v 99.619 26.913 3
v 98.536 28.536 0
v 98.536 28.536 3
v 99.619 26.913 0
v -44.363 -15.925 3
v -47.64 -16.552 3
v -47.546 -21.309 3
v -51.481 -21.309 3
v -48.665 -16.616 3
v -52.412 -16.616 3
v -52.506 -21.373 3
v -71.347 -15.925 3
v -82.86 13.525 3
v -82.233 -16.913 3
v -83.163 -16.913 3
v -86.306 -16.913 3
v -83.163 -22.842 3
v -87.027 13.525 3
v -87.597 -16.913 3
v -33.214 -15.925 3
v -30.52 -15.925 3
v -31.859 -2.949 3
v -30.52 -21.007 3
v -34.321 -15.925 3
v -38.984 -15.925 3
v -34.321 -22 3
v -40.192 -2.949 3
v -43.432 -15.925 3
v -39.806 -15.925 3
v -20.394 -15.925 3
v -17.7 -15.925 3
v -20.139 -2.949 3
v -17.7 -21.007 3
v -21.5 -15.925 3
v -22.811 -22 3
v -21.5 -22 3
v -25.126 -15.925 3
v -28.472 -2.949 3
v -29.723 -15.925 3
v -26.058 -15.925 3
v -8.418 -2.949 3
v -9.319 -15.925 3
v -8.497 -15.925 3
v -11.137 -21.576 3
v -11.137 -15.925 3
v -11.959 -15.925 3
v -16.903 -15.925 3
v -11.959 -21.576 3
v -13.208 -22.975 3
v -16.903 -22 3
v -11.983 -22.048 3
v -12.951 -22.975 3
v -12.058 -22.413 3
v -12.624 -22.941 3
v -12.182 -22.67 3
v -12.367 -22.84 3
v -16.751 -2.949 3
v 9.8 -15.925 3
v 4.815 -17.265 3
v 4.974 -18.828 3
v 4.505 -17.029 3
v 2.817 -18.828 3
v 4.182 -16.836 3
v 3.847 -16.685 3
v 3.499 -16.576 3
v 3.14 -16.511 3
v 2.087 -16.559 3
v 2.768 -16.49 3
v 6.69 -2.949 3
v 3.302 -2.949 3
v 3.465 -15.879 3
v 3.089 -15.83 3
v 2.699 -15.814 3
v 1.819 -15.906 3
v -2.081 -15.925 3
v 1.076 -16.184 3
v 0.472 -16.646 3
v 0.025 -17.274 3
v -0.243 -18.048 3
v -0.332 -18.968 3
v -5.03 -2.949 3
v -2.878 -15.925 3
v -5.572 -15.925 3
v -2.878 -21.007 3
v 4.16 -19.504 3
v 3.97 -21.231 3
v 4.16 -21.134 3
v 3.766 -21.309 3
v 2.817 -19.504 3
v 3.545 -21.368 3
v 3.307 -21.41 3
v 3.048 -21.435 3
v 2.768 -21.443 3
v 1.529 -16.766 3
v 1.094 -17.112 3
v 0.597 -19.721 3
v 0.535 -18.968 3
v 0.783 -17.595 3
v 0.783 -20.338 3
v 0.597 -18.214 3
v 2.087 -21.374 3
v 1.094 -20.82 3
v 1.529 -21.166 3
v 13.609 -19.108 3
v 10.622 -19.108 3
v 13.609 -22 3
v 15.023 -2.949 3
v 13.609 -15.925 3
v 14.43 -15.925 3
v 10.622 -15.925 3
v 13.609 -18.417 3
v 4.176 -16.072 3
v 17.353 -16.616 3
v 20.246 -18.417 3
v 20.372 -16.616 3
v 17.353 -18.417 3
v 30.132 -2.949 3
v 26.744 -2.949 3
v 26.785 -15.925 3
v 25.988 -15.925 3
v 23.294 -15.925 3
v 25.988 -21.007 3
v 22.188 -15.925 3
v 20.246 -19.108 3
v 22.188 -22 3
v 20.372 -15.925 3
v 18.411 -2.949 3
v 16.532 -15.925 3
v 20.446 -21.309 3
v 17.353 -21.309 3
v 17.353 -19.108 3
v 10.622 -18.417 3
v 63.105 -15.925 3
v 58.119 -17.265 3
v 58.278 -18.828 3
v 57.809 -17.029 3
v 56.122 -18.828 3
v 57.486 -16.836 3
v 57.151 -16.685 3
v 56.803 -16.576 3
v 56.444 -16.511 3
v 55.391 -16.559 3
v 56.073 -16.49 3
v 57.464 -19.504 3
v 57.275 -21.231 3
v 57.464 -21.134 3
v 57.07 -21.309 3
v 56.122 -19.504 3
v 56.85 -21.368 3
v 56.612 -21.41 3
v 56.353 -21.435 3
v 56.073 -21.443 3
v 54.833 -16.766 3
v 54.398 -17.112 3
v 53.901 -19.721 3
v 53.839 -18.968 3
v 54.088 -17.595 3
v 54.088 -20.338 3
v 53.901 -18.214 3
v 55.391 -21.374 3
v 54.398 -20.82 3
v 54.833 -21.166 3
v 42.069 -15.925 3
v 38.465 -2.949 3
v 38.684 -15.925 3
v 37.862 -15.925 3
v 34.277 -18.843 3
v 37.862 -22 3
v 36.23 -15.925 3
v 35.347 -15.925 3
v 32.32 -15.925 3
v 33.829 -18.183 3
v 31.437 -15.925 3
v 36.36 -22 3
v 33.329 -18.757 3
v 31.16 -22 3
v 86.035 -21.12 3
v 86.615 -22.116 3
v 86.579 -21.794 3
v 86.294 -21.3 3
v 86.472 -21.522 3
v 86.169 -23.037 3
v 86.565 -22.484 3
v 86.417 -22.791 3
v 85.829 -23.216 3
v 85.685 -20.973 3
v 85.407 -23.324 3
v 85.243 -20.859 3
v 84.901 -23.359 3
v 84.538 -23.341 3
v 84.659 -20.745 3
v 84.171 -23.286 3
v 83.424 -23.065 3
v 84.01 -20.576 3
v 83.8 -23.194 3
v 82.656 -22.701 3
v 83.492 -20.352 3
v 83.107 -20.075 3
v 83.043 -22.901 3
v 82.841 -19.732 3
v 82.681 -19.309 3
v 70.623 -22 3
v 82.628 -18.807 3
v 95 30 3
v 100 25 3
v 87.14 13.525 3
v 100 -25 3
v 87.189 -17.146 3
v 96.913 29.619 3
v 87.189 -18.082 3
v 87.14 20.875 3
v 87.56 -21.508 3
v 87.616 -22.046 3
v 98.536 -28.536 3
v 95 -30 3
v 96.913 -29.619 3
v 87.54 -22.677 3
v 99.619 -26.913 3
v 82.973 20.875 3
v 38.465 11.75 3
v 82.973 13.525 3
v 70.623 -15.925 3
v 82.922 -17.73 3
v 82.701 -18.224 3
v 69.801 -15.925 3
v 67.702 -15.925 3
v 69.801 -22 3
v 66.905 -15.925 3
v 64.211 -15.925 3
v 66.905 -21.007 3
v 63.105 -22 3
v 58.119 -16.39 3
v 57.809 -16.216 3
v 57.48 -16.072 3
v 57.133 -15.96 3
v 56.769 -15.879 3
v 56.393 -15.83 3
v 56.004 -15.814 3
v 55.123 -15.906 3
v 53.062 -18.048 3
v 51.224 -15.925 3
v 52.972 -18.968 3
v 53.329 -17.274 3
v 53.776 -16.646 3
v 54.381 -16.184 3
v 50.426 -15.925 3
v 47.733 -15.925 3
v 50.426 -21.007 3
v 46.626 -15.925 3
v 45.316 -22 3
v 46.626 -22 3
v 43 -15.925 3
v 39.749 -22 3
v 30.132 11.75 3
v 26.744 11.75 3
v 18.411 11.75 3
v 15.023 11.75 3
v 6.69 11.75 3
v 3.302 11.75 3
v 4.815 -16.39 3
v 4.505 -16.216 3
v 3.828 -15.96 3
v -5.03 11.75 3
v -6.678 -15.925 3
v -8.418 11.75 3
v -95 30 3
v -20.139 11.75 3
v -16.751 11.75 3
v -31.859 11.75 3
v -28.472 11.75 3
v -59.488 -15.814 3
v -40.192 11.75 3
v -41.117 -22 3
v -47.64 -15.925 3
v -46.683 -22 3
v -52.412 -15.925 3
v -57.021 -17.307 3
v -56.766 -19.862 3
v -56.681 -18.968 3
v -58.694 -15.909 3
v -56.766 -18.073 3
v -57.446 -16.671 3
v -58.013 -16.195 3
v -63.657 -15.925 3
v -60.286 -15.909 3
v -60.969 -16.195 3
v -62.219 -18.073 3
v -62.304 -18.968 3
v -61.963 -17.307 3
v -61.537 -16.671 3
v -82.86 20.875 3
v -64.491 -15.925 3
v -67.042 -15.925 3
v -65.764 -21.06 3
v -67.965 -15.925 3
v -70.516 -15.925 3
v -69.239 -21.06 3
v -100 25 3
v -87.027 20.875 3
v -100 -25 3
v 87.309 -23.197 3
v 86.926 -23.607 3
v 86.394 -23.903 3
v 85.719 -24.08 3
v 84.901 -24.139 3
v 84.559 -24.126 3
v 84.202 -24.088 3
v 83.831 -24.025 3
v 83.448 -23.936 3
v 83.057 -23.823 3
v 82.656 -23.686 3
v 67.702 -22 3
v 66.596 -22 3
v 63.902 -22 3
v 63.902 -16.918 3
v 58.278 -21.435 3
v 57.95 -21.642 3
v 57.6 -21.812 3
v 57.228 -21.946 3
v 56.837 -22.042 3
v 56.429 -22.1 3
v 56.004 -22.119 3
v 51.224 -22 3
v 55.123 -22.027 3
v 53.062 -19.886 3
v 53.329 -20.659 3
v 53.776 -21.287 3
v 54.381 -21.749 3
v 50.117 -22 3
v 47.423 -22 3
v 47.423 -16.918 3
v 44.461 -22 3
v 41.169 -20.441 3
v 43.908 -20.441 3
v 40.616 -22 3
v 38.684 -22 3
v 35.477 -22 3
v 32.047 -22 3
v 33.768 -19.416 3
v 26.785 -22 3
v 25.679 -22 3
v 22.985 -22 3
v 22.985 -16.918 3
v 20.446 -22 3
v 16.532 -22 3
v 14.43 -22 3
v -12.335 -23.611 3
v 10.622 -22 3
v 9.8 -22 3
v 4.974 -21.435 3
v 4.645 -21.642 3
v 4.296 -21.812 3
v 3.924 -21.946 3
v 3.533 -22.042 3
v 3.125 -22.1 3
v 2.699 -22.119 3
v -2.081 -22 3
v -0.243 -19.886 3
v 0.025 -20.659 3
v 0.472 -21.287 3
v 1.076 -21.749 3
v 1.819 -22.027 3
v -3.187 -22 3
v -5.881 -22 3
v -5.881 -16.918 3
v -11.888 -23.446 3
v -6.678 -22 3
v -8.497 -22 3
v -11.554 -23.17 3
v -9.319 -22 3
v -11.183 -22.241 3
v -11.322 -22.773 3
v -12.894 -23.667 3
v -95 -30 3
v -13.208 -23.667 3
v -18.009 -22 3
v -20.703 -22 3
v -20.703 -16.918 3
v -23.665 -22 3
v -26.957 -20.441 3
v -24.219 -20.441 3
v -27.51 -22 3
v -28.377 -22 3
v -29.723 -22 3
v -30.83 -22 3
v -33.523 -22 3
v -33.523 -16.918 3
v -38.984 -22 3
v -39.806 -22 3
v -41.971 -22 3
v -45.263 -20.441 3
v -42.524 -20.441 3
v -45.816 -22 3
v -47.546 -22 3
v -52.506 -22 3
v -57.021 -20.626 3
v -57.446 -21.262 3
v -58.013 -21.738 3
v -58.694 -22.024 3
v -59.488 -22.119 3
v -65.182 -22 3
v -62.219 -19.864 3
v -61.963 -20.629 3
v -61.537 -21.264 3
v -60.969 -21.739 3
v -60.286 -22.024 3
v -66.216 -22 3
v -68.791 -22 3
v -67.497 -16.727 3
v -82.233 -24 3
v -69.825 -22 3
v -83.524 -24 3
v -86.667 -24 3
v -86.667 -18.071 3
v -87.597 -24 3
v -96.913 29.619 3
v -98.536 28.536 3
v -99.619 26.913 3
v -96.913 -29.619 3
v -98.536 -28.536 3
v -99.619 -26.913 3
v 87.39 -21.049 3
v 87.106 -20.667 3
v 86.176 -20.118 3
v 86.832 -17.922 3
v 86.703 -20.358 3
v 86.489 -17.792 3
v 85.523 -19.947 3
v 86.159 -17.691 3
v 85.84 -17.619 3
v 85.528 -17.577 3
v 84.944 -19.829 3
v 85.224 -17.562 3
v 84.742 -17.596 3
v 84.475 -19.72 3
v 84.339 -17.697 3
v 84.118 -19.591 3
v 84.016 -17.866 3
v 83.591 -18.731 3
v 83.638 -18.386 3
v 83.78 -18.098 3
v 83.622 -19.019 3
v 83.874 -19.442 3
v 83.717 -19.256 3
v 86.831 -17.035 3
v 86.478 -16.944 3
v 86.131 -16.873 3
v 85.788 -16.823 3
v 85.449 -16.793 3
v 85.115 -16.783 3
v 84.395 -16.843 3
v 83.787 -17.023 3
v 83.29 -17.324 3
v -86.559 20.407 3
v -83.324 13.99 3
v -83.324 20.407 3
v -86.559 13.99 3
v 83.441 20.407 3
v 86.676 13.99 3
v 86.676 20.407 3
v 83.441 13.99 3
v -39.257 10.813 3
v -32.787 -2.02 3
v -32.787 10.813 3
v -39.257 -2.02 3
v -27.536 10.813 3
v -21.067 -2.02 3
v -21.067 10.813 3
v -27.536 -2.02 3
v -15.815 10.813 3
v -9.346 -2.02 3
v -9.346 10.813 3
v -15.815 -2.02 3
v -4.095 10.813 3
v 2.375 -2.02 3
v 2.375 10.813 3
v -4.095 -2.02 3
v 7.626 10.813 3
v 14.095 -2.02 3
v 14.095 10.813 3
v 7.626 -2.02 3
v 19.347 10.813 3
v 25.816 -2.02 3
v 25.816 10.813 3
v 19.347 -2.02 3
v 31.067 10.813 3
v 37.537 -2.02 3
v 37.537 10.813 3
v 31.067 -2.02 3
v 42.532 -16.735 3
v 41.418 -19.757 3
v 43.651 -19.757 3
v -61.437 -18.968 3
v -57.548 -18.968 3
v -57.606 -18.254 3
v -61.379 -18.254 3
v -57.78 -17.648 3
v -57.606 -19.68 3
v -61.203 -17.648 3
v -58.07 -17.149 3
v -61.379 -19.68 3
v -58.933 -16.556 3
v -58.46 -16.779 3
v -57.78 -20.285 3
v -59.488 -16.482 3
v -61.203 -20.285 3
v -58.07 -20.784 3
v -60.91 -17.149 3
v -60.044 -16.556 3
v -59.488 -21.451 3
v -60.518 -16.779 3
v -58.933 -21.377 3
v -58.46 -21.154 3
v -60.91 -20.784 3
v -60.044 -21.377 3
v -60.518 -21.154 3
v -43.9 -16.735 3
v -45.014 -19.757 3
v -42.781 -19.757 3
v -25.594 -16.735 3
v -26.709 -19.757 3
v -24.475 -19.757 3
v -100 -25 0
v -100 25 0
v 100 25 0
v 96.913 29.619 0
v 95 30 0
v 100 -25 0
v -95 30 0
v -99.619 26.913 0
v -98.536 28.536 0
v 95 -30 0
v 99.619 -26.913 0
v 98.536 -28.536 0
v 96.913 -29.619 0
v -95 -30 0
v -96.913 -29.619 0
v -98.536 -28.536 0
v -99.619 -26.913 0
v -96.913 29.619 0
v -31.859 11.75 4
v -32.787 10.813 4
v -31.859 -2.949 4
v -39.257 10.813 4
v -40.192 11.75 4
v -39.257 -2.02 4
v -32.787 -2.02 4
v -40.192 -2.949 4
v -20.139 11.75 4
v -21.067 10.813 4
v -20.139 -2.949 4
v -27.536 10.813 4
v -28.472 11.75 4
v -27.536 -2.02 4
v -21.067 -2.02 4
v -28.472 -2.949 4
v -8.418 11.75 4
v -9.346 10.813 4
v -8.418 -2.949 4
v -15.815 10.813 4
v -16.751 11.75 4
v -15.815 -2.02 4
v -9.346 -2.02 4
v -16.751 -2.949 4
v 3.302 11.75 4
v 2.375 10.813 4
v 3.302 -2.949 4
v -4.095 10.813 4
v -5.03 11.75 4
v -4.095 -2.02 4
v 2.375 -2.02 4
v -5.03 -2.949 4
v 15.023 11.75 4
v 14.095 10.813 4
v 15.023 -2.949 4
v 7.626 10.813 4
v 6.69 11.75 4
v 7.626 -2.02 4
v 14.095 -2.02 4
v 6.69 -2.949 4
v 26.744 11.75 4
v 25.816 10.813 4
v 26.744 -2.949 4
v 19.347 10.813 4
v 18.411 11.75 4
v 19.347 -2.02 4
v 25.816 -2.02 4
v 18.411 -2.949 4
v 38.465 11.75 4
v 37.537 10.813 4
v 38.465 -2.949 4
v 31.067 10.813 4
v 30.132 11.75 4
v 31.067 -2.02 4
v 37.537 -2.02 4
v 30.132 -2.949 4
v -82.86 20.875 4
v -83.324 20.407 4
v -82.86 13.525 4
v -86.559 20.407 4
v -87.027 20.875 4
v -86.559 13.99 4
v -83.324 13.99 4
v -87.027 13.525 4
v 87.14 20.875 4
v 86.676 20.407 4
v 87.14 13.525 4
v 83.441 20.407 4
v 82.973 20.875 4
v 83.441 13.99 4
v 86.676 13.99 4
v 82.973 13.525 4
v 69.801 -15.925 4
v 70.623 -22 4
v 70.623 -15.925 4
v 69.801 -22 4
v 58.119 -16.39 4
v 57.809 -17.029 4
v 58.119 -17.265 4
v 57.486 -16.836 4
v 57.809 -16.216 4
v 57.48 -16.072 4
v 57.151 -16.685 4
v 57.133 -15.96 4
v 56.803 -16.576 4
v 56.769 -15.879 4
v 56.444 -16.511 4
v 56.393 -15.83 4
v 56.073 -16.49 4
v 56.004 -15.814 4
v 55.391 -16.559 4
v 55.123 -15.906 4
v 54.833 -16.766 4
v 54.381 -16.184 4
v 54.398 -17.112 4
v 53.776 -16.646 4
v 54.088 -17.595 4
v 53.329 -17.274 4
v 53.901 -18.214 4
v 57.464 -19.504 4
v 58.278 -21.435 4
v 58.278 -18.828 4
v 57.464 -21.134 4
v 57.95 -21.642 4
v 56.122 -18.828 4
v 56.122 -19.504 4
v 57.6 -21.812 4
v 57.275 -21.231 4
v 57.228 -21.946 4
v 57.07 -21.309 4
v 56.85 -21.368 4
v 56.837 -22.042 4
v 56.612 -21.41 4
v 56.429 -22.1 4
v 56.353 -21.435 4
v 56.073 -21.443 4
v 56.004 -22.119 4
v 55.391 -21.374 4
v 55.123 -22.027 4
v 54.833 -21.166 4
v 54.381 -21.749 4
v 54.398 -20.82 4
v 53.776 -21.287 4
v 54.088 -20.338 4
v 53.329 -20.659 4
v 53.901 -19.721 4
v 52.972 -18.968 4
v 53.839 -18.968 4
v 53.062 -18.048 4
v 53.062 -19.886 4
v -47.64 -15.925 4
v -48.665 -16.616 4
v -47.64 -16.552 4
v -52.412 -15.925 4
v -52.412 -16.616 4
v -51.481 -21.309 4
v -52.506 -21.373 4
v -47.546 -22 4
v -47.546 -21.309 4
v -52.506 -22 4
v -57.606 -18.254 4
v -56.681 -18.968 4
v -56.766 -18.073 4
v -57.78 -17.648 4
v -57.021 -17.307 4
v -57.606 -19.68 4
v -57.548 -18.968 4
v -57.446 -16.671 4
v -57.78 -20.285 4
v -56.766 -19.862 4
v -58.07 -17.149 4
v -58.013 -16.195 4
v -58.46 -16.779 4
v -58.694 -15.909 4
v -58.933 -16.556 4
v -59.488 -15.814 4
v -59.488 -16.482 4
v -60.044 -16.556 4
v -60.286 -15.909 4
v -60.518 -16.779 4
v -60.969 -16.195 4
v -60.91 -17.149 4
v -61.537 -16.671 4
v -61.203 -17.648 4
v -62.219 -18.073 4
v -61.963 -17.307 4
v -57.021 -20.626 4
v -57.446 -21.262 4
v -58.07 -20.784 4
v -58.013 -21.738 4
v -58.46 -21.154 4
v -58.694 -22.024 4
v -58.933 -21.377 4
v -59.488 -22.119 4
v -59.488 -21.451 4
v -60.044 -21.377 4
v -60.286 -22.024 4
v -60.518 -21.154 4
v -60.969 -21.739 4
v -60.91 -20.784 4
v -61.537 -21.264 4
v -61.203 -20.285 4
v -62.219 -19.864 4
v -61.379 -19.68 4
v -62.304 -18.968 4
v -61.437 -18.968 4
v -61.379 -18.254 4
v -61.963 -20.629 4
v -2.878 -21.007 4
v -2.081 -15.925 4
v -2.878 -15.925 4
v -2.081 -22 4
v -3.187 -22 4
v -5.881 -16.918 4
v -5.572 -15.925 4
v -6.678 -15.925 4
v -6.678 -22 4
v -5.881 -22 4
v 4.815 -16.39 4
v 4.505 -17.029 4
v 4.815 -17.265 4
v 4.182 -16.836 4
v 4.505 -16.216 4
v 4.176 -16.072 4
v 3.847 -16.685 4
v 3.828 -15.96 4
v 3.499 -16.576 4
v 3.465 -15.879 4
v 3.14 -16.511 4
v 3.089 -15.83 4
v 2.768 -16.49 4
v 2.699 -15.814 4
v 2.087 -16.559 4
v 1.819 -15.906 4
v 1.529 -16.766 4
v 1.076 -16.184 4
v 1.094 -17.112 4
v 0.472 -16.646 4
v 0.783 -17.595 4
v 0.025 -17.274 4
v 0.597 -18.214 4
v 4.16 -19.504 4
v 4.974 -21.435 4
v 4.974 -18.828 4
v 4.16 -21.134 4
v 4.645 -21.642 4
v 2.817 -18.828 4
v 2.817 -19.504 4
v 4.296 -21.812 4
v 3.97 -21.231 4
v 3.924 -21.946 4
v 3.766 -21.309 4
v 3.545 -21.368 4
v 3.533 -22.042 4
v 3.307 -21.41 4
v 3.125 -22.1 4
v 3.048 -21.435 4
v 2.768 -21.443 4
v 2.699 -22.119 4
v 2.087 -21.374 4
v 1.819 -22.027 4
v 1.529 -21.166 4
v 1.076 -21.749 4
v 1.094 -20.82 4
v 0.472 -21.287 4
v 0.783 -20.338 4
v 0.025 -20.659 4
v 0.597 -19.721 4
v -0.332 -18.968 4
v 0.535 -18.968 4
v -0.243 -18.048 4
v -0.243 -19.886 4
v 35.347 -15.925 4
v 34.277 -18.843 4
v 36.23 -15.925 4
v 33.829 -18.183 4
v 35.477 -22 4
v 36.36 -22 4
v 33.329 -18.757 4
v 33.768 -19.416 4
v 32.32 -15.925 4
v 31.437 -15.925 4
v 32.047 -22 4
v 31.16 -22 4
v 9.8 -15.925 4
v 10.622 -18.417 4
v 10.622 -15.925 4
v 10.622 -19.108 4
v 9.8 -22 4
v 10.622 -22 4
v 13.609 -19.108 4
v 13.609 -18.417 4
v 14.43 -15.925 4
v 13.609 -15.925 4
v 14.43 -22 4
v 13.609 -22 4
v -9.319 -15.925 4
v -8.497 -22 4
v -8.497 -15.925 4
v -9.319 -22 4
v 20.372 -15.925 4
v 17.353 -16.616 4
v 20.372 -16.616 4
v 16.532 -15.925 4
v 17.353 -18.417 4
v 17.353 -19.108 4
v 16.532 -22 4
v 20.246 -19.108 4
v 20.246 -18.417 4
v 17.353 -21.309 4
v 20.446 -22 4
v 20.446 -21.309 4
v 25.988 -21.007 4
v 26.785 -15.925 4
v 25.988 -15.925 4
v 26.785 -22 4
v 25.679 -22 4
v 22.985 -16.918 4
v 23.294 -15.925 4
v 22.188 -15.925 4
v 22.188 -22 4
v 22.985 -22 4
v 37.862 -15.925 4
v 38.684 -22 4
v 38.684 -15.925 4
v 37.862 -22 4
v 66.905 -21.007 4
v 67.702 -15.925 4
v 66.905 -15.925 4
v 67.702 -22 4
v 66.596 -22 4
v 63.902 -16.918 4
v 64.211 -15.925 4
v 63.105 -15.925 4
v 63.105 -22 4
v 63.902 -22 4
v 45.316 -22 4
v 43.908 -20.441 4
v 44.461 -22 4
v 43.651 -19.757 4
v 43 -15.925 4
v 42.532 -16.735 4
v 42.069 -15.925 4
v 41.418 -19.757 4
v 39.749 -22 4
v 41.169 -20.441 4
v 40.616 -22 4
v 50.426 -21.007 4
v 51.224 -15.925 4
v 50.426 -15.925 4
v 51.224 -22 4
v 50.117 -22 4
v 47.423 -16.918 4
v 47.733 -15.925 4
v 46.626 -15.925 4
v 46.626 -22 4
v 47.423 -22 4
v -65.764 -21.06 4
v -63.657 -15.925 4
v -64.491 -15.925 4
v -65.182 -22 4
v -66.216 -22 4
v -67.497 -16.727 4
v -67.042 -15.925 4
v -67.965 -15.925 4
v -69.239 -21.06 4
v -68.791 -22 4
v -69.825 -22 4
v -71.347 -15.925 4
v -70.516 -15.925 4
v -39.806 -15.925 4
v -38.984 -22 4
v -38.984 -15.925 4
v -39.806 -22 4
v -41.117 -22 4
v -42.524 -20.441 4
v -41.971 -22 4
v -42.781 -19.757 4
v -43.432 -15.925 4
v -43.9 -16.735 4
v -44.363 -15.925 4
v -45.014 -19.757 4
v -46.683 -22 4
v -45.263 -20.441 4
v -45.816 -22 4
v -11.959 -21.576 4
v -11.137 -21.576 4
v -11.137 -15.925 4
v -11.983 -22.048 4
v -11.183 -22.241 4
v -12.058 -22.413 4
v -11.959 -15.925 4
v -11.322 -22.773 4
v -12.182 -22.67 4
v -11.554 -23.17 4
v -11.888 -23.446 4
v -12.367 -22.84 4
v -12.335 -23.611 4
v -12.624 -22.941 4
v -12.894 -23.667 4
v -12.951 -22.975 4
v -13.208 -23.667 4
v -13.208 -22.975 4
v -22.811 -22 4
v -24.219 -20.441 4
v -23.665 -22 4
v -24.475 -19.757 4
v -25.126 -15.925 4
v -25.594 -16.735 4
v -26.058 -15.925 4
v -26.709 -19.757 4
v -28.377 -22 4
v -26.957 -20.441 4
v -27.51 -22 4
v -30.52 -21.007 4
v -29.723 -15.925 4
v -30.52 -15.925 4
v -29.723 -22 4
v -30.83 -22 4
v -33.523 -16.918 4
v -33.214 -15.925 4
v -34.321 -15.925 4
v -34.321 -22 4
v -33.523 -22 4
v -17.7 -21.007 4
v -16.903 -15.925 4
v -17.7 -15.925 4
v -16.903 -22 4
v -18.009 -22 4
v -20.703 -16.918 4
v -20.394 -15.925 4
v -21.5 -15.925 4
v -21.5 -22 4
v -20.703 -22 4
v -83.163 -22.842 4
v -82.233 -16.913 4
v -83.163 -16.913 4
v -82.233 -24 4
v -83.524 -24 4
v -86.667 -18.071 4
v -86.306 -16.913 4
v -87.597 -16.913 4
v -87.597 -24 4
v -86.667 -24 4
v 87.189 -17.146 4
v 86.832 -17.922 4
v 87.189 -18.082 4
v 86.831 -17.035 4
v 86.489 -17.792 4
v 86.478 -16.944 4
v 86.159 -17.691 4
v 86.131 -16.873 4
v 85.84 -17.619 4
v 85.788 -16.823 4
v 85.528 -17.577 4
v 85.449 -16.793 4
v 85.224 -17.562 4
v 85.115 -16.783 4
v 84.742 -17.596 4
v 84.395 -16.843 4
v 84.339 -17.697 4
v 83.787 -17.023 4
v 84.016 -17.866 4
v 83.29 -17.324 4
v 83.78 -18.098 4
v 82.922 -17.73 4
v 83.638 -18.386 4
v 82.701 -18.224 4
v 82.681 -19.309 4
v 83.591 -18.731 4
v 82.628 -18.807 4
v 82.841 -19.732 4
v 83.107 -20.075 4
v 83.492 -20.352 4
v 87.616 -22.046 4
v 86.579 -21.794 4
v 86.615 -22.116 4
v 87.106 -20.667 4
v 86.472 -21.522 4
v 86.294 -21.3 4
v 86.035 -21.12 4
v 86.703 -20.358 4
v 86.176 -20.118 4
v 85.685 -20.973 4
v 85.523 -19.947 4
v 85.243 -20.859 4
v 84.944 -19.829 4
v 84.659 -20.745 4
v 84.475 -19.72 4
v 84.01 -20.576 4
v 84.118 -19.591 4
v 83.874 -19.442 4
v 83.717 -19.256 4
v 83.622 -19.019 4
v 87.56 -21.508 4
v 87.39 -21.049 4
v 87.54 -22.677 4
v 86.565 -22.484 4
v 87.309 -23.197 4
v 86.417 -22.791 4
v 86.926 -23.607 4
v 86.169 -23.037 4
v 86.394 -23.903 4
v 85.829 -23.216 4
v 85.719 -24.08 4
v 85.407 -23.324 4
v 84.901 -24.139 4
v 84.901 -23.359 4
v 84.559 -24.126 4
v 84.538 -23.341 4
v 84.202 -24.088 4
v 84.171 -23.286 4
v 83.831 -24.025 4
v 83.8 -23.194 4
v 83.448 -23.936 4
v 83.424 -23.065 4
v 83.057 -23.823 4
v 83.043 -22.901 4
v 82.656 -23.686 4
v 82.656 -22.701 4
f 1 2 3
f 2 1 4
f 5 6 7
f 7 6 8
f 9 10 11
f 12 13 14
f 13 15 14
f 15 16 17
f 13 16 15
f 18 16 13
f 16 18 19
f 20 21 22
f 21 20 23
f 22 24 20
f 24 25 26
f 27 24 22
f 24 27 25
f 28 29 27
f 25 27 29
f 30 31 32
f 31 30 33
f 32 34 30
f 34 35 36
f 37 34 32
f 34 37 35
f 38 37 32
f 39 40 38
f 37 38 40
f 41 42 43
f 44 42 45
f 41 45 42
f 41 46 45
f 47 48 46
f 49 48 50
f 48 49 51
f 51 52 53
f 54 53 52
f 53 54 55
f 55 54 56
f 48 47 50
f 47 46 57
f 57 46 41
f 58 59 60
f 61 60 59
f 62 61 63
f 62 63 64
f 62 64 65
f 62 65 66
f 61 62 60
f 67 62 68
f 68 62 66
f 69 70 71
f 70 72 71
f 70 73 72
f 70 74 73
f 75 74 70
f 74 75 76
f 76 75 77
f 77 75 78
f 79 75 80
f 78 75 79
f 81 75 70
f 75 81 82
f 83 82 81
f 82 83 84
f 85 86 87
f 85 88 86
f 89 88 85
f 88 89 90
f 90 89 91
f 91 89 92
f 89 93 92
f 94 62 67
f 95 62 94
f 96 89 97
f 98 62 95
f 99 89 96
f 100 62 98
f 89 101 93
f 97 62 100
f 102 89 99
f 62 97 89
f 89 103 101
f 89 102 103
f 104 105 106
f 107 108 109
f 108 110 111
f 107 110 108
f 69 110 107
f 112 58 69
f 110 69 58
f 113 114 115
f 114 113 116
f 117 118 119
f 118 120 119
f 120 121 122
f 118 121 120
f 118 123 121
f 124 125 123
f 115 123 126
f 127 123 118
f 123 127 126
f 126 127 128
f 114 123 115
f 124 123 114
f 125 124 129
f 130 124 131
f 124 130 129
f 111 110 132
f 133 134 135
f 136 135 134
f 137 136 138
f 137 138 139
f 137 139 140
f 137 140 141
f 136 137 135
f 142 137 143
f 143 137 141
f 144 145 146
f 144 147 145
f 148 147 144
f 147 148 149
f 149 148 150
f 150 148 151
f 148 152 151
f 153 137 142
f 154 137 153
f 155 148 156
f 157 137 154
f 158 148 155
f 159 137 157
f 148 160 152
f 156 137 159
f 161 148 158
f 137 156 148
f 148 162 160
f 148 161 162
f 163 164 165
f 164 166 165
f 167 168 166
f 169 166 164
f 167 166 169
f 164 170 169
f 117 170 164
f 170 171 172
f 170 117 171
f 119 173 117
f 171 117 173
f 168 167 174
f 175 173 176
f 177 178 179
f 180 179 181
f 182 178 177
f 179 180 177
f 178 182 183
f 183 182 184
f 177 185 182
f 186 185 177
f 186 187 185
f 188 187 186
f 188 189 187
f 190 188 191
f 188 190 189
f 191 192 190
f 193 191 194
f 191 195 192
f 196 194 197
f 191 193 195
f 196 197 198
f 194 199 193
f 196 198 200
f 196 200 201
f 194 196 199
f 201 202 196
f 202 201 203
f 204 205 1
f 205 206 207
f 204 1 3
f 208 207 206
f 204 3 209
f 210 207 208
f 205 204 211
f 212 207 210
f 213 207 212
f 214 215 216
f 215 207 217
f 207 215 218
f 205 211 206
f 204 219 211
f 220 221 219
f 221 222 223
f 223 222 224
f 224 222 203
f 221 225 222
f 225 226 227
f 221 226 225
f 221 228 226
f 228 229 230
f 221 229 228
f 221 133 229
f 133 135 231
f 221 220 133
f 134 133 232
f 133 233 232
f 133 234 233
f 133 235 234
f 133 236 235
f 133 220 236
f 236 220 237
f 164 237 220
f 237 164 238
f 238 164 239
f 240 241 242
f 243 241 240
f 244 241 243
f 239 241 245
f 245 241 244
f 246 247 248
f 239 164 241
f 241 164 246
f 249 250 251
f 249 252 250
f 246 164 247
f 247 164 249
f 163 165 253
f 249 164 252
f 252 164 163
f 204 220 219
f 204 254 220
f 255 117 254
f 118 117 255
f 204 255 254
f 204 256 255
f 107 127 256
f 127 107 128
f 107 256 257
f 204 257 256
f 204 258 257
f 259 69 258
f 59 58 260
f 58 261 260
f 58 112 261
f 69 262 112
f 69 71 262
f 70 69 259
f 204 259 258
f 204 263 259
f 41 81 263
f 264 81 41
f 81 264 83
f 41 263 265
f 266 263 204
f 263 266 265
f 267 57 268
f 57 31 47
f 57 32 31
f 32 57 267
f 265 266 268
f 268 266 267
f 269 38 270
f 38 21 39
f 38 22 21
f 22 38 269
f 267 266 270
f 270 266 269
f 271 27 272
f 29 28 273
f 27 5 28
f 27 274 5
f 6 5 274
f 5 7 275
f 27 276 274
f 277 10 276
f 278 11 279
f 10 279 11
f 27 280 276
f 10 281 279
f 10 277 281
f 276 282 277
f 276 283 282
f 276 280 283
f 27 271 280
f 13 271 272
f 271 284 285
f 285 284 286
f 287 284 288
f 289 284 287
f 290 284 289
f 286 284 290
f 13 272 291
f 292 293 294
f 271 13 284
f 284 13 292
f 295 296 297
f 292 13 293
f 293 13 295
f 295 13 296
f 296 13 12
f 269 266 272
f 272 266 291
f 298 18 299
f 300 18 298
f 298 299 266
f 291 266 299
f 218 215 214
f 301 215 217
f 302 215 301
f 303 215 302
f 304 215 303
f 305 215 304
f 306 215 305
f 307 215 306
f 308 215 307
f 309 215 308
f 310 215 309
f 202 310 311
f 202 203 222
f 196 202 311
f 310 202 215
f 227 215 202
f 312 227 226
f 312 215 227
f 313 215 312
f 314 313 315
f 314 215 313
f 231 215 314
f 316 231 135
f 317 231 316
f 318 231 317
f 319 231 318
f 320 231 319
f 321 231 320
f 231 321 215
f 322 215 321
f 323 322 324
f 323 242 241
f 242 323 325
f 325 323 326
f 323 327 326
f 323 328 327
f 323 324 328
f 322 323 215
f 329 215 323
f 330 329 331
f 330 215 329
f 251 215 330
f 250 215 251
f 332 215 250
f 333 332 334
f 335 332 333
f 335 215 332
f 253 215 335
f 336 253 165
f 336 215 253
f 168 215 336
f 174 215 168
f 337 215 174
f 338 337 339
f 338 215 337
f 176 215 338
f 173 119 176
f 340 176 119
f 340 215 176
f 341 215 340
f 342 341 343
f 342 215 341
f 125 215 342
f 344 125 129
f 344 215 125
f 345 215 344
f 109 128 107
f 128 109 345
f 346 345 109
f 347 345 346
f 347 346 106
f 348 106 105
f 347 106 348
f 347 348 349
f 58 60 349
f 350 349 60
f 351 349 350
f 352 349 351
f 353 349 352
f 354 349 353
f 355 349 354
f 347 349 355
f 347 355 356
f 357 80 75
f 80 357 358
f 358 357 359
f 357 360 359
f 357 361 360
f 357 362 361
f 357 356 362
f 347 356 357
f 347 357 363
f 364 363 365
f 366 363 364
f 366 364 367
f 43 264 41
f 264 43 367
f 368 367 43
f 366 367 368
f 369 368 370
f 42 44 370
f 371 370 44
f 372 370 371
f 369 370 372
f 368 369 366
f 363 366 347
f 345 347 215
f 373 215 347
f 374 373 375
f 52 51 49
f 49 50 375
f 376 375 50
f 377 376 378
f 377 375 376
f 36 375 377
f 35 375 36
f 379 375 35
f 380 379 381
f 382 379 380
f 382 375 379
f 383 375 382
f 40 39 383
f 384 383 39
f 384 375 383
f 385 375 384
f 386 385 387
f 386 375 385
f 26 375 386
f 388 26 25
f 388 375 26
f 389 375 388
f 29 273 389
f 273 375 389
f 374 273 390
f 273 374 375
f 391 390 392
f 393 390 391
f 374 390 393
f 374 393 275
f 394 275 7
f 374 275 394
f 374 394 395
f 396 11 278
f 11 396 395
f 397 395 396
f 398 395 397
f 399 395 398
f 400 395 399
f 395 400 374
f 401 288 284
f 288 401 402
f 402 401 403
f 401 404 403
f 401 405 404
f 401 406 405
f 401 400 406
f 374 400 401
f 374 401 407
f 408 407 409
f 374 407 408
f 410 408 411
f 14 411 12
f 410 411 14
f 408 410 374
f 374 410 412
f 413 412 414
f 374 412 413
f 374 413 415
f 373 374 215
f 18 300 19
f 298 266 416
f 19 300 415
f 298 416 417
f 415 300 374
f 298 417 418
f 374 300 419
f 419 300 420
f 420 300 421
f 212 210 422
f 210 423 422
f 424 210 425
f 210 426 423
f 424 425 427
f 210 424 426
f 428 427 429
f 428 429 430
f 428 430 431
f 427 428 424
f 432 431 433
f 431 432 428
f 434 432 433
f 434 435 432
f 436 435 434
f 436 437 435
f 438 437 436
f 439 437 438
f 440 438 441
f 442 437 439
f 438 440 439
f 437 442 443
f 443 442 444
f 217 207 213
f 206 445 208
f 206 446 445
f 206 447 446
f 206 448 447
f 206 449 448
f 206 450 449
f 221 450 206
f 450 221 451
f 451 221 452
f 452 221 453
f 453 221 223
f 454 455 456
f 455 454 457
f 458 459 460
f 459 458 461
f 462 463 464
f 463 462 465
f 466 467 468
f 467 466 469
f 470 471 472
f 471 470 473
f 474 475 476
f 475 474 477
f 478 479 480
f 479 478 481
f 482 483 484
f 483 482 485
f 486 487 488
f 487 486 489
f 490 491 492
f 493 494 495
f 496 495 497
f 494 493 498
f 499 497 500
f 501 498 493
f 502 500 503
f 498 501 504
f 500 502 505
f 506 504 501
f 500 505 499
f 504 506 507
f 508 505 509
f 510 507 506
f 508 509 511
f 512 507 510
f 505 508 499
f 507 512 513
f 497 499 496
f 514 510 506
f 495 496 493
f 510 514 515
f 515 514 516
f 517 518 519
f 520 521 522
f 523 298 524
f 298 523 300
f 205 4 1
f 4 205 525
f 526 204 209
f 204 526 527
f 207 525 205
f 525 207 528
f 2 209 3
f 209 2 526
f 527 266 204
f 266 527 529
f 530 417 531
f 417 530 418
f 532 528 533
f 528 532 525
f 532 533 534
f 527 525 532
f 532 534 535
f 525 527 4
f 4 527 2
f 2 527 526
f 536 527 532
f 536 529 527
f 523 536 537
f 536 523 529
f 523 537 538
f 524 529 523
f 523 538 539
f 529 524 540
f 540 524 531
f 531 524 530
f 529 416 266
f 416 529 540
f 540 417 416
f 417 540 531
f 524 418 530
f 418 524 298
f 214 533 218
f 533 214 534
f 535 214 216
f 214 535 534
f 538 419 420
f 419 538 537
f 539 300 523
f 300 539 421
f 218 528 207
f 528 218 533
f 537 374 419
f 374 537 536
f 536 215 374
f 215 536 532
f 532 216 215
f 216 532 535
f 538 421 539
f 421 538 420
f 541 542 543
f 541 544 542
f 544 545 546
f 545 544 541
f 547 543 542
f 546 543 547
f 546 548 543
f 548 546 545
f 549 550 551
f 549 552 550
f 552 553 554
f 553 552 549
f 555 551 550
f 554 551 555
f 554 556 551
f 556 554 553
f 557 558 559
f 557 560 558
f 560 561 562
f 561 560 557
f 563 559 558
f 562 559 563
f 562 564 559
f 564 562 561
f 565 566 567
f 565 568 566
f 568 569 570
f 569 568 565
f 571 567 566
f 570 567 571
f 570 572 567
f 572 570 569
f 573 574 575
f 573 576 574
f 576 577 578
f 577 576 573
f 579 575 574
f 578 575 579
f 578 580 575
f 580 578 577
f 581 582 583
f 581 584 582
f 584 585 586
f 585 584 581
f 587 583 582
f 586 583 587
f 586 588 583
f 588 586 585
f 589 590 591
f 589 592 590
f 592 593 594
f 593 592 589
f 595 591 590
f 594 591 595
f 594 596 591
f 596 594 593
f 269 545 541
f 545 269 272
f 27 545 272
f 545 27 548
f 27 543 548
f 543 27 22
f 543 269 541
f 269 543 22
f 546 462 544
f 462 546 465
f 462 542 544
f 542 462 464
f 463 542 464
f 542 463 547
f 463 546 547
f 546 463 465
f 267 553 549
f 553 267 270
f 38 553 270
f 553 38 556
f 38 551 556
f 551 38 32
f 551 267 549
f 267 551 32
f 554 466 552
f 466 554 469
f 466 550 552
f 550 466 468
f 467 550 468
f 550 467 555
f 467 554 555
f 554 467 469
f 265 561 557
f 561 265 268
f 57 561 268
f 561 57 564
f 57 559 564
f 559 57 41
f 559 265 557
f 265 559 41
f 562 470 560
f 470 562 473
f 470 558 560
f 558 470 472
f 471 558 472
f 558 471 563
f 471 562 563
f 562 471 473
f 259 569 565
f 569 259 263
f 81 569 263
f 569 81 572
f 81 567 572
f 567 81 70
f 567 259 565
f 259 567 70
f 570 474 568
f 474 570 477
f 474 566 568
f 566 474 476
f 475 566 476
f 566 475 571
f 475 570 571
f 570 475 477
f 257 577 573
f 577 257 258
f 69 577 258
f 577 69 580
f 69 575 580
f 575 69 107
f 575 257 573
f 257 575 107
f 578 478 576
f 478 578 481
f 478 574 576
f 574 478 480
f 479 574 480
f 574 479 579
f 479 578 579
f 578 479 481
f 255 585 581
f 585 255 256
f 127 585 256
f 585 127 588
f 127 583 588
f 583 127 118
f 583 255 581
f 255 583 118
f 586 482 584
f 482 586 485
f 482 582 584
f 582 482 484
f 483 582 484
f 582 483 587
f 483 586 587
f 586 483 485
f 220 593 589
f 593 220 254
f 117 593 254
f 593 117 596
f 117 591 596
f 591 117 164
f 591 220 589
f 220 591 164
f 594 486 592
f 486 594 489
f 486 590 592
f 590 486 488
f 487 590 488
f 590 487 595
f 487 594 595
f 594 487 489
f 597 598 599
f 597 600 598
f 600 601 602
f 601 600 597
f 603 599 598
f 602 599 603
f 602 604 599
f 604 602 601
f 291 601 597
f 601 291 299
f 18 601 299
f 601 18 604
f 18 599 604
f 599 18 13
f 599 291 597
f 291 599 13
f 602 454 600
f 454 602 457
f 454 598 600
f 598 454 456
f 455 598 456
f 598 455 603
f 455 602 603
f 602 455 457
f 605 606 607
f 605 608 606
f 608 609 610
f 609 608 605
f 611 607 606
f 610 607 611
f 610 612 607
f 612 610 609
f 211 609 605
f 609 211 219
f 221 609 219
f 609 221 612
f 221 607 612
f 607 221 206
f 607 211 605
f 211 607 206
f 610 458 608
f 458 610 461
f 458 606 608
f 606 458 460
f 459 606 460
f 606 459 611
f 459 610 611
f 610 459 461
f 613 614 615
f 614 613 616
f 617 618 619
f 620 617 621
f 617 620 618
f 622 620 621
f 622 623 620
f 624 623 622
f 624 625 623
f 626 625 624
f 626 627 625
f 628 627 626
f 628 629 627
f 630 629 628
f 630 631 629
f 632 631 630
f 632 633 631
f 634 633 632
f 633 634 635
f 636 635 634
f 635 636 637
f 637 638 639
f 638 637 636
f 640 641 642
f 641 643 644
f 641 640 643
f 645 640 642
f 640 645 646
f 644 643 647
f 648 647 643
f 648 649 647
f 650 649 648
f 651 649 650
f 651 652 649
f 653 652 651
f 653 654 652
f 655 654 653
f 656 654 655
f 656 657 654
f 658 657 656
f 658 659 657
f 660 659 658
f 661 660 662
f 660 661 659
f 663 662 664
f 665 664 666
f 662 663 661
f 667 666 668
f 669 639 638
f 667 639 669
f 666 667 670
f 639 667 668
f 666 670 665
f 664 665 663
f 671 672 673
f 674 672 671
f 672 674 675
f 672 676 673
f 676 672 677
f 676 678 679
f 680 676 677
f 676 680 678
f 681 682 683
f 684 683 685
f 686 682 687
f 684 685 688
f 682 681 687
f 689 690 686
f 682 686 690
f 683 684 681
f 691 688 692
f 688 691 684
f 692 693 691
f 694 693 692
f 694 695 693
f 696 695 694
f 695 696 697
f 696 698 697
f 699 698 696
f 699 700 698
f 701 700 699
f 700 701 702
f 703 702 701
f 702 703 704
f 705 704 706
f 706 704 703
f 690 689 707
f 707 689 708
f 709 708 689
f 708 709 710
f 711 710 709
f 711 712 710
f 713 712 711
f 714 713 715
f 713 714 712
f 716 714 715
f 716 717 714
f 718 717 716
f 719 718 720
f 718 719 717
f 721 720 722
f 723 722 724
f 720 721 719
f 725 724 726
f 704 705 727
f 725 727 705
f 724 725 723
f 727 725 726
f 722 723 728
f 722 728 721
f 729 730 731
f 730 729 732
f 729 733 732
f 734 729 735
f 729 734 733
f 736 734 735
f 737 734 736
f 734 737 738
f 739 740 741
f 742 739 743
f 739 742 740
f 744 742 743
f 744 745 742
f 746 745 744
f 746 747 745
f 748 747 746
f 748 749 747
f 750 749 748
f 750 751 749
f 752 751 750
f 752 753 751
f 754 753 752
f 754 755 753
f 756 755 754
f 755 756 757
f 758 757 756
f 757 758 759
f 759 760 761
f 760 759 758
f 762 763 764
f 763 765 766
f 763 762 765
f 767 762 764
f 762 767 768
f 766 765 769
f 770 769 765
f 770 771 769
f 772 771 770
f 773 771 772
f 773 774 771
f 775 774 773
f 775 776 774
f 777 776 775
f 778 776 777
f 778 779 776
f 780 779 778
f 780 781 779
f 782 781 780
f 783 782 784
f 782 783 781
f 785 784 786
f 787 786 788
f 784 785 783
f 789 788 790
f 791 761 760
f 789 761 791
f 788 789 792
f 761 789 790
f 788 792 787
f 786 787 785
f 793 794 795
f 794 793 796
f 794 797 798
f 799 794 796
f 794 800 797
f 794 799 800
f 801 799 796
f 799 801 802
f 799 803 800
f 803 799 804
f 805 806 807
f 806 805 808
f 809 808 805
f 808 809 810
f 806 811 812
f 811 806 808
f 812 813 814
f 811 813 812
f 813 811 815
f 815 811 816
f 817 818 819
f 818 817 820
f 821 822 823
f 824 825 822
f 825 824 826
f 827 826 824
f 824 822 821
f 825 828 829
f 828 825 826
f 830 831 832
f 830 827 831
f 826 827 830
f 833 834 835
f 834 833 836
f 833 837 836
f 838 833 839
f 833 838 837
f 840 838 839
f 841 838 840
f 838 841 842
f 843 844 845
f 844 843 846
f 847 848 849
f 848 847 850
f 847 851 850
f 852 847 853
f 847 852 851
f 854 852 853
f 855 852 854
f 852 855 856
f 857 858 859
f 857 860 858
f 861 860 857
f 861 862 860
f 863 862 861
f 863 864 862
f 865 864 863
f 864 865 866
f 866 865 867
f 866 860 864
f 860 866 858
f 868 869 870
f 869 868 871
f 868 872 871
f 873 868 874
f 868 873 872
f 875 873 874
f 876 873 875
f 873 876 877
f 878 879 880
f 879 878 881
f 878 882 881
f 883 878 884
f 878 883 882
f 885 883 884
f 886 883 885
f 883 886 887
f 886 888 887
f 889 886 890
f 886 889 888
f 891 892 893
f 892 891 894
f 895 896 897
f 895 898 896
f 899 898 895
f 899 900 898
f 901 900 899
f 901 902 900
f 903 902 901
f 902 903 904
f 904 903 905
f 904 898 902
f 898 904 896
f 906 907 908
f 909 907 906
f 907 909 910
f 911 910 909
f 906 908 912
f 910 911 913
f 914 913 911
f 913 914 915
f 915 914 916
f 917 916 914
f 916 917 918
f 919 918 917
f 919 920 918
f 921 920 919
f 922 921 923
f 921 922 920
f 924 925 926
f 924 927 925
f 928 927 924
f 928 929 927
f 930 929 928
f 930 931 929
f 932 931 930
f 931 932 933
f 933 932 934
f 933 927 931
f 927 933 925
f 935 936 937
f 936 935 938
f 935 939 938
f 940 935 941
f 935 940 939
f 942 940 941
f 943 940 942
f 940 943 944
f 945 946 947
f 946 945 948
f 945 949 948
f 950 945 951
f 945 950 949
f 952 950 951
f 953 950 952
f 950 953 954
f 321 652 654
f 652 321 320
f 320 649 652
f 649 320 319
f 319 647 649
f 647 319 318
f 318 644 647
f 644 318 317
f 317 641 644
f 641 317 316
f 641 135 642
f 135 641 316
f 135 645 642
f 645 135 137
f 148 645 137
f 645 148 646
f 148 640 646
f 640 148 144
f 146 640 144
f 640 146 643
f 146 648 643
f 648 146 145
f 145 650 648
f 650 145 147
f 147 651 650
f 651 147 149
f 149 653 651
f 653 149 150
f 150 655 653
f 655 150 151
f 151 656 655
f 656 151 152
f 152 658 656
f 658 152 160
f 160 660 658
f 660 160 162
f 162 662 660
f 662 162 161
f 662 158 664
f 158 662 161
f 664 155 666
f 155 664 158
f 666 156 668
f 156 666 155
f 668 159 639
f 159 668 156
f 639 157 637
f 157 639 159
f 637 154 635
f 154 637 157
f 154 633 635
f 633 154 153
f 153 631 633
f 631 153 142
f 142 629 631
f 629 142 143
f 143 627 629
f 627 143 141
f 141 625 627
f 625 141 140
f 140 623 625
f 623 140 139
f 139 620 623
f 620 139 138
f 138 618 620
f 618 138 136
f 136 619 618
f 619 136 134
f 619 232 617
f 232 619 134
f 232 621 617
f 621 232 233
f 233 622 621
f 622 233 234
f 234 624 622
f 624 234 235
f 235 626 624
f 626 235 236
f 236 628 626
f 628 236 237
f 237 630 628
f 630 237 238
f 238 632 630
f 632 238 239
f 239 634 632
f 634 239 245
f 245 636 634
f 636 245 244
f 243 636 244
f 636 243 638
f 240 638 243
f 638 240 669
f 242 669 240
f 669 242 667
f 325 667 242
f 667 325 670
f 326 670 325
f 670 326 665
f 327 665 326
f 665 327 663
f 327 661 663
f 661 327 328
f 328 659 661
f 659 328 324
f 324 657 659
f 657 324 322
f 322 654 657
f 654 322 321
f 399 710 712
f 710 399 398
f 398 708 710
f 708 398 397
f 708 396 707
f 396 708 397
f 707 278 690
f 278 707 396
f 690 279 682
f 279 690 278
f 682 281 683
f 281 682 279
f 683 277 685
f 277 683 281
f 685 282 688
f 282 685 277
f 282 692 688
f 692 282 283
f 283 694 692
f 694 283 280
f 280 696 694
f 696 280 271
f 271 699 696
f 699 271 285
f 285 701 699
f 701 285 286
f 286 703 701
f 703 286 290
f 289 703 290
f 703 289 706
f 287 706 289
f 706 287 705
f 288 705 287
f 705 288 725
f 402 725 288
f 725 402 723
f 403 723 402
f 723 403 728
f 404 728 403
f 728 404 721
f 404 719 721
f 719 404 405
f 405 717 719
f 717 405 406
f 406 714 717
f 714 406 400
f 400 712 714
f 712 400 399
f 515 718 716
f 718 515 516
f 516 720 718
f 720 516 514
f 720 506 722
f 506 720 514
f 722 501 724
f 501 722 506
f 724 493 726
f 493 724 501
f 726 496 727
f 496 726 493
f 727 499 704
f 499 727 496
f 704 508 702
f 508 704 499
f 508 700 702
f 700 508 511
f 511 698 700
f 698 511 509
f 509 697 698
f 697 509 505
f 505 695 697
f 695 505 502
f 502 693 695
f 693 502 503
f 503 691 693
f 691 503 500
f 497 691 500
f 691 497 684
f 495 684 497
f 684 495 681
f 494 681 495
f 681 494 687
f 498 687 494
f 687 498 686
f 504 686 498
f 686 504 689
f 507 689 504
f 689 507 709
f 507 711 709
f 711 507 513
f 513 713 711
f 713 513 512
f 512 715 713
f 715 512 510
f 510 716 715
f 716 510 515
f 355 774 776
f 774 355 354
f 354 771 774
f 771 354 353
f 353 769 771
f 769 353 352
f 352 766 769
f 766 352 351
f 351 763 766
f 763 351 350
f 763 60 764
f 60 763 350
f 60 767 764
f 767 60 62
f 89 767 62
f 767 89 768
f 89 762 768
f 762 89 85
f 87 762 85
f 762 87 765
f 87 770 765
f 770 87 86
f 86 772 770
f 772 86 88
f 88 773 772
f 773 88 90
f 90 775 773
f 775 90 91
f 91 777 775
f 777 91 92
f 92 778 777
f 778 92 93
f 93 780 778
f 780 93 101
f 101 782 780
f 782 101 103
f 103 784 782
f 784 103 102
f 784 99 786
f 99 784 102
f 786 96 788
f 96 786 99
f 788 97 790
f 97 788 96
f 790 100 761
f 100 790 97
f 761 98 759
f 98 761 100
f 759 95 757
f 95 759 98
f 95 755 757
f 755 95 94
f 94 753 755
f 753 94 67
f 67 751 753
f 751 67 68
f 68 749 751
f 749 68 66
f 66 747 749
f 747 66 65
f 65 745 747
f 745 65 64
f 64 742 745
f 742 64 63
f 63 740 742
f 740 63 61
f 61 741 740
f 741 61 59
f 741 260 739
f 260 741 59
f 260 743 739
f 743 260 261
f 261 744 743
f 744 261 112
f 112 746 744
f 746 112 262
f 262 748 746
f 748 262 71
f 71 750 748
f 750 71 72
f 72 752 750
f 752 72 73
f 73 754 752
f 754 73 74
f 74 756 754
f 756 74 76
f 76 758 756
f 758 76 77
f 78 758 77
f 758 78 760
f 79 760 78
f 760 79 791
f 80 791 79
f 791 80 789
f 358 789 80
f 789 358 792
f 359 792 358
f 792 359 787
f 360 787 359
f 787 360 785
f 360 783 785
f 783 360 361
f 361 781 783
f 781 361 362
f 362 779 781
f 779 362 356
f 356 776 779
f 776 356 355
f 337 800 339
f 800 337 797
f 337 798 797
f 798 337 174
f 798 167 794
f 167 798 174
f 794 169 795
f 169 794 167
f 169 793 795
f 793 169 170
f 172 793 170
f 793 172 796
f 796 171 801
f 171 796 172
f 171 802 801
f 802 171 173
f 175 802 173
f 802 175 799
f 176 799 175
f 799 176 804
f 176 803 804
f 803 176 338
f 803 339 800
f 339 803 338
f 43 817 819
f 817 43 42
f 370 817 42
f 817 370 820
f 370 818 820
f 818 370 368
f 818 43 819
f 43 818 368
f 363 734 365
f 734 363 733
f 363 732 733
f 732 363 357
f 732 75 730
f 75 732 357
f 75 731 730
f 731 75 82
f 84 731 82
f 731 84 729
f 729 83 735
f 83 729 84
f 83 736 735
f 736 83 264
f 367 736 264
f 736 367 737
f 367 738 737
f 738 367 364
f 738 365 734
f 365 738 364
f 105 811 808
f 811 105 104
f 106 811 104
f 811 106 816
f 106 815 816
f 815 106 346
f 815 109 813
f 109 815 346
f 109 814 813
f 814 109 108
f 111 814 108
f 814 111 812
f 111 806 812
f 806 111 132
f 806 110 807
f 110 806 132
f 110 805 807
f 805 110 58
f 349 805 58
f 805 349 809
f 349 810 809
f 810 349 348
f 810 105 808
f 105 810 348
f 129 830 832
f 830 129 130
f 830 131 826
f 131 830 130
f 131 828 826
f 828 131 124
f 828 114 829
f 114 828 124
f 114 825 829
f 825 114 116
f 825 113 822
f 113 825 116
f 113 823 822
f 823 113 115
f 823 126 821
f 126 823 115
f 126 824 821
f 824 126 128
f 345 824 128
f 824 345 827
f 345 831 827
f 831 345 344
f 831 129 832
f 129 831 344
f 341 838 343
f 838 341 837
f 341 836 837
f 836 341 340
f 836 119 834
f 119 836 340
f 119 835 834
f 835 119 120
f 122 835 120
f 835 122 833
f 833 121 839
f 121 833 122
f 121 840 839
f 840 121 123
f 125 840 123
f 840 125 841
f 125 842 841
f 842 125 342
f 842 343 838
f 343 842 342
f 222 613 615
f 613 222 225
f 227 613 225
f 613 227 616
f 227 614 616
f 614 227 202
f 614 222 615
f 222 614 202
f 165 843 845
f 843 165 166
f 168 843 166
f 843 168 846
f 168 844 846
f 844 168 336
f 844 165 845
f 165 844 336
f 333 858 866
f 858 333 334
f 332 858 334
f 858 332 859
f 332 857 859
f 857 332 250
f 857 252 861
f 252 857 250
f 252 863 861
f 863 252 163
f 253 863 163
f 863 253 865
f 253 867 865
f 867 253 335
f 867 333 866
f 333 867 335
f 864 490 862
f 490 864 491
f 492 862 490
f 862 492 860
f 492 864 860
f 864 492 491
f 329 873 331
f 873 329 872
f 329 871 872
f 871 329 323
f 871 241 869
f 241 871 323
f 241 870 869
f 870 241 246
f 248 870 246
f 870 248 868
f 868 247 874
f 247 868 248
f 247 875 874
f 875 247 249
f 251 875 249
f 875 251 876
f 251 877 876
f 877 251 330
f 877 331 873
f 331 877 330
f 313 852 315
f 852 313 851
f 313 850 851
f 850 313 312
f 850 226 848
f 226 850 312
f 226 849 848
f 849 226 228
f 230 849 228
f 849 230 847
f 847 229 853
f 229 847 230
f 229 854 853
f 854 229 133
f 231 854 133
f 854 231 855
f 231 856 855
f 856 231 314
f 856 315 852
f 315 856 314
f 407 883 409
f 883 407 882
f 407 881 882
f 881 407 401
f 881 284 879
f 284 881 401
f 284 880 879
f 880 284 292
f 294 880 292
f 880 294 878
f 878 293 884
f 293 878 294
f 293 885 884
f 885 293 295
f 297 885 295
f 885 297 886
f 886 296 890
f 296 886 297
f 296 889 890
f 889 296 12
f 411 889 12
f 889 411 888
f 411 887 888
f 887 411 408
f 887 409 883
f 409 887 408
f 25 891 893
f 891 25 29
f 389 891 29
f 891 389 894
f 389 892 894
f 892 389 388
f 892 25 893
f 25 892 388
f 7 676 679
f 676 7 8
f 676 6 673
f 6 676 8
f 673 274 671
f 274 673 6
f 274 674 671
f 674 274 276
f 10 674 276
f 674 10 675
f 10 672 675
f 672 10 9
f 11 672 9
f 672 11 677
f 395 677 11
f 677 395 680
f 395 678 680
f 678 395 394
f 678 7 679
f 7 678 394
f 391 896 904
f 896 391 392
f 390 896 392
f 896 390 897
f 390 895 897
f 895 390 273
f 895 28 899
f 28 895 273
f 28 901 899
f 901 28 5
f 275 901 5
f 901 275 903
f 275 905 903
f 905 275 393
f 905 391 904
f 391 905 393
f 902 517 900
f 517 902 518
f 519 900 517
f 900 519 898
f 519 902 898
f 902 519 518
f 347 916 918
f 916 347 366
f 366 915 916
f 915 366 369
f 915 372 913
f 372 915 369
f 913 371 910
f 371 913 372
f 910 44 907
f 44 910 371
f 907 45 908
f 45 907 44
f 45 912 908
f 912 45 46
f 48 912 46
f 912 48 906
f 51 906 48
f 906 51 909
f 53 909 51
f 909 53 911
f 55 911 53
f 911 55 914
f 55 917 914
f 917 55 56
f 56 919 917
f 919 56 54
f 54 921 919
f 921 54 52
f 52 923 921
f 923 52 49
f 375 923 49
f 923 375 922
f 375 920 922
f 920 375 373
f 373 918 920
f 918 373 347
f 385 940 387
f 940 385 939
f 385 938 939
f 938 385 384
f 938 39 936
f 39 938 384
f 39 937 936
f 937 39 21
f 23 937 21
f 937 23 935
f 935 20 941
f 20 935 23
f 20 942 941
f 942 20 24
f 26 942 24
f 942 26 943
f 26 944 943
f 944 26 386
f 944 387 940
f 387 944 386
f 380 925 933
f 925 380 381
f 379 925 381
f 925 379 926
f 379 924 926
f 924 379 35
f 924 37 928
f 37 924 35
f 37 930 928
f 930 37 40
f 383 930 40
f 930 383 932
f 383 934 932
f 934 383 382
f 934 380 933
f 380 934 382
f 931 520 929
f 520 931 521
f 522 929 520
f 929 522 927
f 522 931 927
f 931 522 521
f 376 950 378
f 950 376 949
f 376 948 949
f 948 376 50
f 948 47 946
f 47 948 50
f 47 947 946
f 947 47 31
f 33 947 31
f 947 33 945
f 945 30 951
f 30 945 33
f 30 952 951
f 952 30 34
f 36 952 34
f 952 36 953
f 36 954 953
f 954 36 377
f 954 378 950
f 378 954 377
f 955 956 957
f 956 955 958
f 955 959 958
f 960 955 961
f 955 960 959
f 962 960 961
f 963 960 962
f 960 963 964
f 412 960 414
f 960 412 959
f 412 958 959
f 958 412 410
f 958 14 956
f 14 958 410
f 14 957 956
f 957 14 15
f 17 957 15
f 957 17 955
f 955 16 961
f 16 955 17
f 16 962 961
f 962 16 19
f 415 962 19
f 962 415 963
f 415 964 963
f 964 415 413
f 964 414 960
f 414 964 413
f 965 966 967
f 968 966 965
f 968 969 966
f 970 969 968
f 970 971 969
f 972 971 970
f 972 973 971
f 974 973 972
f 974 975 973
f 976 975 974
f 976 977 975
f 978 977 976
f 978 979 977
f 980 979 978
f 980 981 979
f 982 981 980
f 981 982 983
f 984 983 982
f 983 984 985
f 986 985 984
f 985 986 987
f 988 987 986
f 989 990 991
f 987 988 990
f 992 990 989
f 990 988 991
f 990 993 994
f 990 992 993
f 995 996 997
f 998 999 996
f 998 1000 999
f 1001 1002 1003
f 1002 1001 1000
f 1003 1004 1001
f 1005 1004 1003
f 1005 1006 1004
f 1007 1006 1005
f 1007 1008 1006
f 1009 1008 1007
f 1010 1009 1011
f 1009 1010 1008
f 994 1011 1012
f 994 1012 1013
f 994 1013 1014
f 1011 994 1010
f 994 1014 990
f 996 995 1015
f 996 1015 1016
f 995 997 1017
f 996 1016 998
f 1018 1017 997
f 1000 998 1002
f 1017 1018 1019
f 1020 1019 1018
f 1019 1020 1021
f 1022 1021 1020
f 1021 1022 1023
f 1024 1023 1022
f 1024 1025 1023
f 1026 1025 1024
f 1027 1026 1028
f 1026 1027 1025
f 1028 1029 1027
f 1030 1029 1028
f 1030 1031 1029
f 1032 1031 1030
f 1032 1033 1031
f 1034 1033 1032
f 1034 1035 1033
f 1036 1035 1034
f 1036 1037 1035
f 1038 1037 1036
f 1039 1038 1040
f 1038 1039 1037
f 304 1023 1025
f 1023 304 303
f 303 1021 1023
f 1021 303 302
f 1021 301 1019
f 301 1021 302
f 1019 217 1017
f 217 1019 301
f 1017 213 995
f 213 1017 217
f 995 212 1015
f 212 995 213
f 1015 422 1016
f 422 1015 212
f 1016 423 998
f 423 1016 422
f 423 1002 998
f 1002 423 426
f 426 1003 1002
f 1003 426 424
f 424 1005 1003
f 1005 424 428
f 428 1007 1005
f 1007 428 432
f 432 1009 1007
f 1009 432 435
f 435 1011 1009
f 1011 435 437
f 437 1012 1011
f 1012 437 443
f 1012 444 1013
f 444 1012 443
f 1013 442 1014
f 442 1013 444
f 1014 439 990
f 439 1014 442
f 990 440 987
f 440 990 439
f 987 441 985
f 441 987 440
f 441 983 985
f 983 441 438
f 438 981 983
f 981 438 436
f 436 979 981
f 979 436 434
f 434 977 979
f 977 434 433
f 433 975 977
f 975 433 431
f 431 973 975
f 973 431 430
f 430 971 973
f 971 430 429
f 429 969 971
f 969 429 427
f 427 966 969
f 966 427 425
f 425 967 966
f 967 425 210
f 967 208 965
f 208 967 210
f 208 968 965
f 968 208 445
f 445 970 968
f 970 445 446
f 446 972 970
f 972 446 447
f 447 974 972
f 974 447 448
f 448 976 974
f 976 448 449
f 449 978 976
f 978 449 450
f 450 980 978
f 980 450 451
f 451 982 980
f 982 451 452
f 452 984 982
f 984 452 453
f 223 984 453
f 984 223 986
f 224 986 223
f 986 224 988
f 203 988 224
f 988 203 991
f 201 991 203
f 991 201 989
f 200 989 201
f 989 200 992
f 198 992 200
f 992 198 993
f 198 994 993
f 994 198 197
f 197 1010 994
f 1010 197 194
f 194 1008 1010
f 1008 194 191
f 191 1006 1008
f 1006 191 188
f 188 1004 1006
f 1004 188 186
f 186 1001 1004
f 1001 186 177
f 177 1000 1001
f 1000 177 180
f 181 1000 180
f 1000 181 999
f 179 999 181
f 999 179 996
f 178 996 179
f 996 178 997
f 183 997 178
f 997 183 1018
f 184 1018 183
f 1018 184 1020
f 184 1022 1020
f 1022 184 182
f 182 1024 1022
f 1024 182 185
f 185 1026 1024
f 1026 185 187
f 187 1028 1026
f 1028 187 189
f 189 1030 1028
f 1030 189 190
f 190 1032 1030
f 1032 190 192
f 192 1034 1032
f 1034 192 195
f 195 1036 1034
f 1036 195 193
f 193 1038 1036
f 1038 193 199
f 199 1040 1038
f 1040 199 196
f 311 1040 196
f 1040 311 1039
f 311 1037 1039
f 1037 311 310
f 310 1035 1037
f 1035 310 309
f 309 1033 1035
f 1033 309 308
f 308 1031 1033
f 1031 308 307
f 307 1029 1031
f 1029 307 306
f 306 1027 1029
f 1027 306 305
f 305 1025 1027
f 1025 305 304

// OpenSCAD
// 文字内容
chinese_text = "我在南京很想你"; 
// 拼音内容
pinyin_text = "WO ZAI NAN JING HEN XIANG NI"; 

// 中文字体
chinese_font = "Noto Sans SC:style=Black";
// 拼音字体  
english_font = "Inter Tight:style=SemiBold";  



// N
N = "N"; 
// S
S = "S";  
// 南字
nan = "南";
// 北字
bei = "北";  



// 圆角半径   
corner_r = 5; 
// 文字凸起高度
text_height = 1;


/**
* 标牌参数
*/
// 宽度
width = 200;
// 高度  
height = 60;
// 厚度  
depth = 3; 


// 主体
union() {
    union() {
        // 蓝色主体部分（上面2/3）
        color("RoyalBlue")
        linear_extrude(depth)
        difference() {
            // 整体形状
            offset(r=corner_r)
            offset(r=-corner_r)
            square([width, height], center=true);
            // 减去下面1/3部分
            translate([0, -height/3])
            square([width+1, height/3], center=true);
        }
        
        // 白色底部部分（下面1/3）
        color("White")
        linear_extrude(depth)
        intersection() {
            // 整体形状
            offset(r=corner_r)
            offset(r=-corner_r)
            square([width, height], center=true);
            // 只保留下面1/3部分
            translate([0, -height/3])
            square([width+1, height/3], center=true);
        }
    }
    
    // 白色中文文字
    color("White") {
        // 主要中文文字
        translate([0, 0, depth])
        linear_extrude(text_height)
        text(chinese_text, size=12, spacing=1.2, halign="center", font=chinese_font);
        
        // 北标记
        translate([-width/2+15, height/2-15, depth])
        linear_extrude(text_height)
        text(bei, size=6, halign="center", font=chinese_font);
        
        // 南标记
        translate([width/2-15, height/2-15, depth])
        linear_extrude(text_height)
        text(nan, size=6, halign="center", font=chinese_font);
    }
    
    // 黑色文字
    color("Black") {
        // 拼音文字
        translate([0, -22, depth])
        linear_extrude(text_height)
        text(pinyin_text, size=6, spacing=1.1, halign="center", font=english_font);
        
        // N标记
        translate([-width/2+15, height/2-54, depth])
        linear_extrude(text_height)
        text(N, size=7, halign="center", font=english_font);
        
        // S标记
        translate([width/2-15, height/2-54, depth])
        linear_extrude(text_height)
        text(S, size=7, halign="center", font=english_font);
    }
}
